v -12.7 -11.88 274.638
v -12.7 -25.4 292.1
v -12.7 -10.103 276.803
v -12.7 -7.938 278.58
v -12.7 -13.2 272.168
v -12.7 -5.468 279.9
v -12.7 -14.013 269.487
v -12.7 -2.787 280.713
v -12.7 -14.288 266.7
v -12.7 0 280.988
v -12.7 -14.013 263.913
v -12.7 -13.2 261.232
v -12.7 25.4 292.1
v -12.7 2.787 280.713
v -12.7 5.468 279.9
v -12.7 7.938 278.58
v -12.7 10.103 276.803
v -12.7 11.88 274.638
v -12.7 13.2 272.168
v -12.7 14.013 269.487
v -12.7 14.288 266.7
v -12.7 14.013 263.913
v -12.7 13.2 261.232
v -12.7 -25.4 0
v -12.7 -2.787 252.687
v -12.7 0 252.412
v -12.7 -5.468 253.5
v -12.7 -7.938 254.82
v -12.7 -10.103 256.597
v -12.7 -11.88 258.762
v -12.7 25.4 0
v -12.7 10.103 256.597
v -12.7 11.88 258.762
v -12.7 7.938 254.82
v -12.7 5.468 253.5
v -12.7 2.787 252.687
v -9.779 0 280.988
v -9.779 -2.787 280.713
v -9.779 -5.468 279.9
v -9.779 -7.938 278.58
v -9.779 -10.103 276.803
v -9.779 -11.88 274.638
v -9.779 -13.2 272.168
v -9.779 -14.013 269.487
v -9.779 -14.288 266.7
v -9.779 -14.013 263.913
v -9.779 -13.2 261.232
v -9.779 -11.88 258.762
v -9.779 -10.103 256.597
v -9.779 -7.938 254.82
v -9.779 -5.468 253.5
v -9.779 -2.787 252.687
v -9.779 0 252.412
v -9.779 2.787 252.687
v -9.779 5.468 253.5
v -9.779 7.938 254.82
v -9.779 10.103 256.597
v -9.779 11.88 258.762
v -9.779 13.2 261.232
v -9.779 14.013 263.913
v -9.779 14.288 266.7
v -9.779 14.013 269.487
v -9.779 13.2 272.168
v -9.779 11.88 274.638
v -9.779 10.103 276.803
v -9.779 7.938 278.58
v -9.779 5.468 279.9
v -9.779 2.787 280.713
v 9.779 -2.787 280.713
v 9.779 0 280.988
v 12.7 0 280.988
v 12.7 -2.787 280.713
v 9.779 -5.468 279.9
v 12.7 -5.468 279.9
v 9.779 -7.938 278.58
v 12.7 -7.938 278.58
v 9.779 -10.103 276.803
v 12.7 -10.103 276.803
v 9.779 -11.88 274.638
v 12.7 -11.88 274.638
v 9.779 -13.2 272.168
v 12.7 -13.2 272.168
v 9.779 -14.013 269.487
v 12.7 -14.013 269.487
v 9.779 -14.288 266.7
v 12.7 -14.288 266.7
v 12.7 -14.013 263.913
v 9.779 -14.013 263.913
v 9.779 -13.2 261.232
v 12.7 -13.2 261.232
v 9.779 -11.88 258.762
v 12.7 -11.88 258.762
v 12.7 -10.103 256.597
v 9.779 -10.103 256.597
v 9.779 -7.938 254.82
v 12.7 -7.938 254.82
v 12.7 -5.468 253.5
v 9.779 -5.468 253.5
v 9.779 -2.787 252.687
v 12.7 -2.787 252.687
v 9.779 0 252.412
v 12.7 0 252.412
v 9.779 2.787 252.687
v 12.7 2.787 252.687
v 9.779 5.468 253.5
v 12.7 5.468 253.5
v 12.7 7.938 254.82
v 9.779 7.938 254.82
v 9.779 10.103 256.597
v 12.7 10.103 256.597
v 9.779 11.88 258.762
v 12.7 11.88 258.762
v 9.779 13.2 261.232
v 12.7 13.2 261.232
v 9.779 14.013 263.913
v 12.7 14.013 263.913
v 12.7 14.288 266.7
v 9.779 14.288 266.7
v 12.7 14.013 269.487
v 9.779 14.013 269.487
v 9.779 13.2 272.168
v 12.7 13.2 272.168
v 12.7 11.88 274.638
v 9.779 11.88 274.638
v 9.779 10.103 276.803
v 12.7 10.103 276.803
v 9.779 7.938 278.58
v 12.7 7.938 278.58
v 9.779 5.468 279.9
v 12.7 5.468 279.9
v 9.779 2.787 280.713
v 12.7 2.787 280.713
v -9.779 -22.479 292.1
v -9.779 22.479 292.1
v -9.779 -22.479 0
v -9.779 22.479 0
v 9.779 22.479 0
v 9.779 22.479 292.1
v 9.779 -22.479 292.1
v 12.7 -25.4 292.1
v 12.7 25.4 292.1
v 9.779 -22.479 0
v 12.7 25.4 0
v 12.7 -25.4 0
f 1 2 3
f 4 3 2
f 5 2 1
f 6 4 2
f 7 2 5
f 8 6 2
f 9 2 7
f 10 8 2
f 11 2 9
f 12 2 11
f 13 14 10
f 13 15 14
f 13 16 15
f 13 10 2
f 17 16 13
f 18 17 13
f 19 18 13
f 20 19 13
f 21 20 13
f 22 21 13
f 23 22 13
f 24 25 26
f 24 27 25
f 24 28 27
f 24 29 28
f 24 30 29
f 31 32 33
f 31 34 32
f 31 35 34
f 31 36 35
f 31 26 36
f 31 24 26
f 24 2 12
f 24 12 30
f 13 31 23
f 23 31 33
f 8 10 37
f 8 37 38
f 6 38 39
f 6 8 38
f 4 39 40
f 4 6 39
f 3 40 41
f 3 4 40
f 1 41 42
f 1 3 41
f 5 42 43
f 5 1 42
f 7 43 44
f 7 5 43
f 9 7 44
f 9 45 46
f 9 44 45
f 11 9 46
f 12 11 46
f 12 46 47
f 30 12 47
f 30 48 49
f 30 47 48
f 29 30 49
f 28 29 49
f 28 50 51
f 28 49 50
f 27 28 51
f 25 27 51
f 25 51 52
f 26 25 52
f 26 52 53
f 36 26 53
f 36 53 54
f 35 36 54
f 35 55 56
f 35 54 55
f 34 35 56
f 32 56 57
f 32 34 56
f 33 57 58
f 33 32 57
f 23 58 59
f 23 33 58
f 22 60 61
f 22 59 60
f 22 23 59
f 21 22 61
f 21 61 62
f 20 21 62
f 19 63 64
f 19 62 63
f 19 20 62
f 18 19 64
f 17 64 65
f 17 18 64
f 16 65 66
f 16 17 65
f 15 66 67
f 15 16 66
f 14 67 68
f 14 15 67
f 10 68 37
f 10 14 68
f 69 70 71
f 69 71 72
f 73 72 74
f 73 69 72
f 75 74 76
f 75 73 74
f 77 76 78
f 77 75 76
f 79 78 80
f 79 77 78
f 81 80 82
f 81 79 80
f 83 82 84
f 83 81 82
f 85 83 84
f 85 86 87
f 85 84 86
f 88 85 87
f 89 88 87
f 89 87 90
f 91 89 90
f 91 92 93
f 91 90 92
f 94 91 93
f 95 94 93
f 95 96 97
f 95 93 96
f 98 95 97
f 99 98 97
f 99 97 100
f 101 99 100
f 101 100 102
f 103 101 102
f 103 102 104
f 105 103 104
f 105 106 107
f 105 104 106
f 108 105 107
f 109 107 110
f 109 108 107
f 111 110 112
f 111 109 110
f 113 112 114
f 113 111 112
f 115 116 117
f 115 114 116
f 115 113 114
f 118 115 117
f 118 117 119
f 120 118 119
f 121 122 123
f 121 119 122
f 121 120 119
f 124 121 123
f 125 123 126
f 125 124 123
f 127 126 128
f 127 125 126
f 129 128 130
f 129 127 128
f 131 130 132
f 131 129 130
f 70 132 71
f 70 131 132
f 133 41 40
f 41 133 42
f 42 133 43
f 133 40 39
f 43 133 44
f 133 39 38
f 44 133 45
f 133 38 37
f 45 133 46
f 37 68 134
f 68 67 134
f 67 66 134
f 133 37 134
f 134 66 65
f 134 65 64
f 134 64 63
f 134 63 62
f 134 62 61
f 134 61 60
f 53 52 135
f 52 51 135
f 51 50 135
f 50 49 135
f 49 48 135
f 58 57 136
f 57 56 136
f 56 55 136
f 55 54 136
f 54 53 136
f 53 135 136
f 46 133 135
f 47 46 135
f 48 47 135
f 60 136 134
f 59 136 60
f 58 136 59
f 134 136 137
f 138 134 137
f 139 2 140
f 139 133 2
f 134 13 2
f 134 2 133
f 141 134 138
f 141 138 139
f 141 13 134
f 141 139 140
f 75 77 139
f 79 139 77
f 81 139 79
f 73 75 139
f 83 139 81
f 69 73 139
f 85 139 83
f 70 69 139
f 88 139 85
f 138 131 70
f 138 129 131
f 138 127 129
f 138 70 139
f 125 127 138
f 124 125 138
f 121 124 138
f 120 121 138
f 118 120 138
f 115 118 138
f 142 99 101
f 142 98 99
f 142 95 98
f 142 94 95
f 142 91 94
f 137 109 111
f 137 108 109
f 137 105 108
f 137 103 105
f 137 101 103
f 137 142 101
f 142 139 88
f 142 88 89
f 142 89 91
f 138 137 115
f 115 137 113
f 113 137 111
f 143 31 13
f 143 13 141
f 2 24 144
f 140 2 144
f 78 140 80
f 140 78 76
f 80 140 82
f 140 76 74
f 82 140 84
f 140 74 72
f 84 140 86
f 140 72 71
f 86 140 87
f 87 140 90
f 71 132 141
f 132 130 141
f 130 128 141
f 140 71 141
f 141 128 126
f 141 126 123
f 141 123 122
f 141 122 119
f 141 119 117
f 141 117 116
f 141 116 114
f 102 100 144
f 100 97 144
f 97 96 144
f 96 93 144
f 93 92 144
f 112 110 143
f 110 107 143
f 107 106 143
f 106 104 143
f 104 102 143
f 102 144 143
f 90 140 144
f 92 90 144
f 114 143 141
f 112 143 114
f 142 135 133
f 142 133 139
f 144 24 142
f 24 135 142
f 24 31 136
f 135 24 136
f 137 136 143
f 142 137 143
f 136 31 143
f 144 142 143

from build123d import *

# Parameters (mm, degrees)
F_2X1_BLANK_EXTRUSION_OUTLINE_W   = 25.4
F_2X1_BLANK_EXTRUSION_OUTLINE_H   = 50.8
F_2X1_BLANK_EXTRUSION_OUTLINE_W_2 = 19.558
F_2X1_BLANK_EXTRUSION_OUTLINE_H_2 = 44.958
F_2X1_BLANK_EXTRUSION_DEPTH       = 292.1
CUT_EXTRUDE1_DEPTH                = 295.300407747
CUT_EXTRUDE1_DEPTH_BACK           = 295.300407747
SKETCH1_R                         = 14.2875


# Read off the part's stored shape, not the designer's step: 2x1 blank extrusion
with BuildPart() as part:
    # 2x1 blank extrusion outline → 2x1 blank extrusion (new body)
    with BuildSketch(Plane.XY):
        Rectangle(F_2X1_BLANK_EXTRUSION_OUTLINE_W, F_2X1_BLANK_EXTRUSION_OUTLINE_H)
        Rectangle(F_2X1_BLANK_EXTRUSION_OUTLINE_W_2, F_2X1_BLANK_EXTRUSION_OUTLINE_H_2, mode=Mode.SUBTRACT)
    extrude(amount=F_2X1_BLANK_EXTRUSION_DEPTH)

    # Sketch1 → Cut-Extrude1 (cut, two sides: drawn at the far end of the back side and taken through both)
    with BuildSketch(Plane(origin=(12.7, 0, 0), x_dir=(0, 0, -1), z_dir=(1, 0, 0)).offset(-CUT_EXTRUDE1_DEPTH_BACK)):
        with Locations(Location((-266.7, 0, 0), (0, 0, 180))):
            Circle(SKETCH1_R)
    extrude(amount=CUT_EXTRUDE1_DEPTH + CUT_EXTRUDE1_DEPTH_BACK, mode=Mode.SUBTRACT)


solid = part.part
